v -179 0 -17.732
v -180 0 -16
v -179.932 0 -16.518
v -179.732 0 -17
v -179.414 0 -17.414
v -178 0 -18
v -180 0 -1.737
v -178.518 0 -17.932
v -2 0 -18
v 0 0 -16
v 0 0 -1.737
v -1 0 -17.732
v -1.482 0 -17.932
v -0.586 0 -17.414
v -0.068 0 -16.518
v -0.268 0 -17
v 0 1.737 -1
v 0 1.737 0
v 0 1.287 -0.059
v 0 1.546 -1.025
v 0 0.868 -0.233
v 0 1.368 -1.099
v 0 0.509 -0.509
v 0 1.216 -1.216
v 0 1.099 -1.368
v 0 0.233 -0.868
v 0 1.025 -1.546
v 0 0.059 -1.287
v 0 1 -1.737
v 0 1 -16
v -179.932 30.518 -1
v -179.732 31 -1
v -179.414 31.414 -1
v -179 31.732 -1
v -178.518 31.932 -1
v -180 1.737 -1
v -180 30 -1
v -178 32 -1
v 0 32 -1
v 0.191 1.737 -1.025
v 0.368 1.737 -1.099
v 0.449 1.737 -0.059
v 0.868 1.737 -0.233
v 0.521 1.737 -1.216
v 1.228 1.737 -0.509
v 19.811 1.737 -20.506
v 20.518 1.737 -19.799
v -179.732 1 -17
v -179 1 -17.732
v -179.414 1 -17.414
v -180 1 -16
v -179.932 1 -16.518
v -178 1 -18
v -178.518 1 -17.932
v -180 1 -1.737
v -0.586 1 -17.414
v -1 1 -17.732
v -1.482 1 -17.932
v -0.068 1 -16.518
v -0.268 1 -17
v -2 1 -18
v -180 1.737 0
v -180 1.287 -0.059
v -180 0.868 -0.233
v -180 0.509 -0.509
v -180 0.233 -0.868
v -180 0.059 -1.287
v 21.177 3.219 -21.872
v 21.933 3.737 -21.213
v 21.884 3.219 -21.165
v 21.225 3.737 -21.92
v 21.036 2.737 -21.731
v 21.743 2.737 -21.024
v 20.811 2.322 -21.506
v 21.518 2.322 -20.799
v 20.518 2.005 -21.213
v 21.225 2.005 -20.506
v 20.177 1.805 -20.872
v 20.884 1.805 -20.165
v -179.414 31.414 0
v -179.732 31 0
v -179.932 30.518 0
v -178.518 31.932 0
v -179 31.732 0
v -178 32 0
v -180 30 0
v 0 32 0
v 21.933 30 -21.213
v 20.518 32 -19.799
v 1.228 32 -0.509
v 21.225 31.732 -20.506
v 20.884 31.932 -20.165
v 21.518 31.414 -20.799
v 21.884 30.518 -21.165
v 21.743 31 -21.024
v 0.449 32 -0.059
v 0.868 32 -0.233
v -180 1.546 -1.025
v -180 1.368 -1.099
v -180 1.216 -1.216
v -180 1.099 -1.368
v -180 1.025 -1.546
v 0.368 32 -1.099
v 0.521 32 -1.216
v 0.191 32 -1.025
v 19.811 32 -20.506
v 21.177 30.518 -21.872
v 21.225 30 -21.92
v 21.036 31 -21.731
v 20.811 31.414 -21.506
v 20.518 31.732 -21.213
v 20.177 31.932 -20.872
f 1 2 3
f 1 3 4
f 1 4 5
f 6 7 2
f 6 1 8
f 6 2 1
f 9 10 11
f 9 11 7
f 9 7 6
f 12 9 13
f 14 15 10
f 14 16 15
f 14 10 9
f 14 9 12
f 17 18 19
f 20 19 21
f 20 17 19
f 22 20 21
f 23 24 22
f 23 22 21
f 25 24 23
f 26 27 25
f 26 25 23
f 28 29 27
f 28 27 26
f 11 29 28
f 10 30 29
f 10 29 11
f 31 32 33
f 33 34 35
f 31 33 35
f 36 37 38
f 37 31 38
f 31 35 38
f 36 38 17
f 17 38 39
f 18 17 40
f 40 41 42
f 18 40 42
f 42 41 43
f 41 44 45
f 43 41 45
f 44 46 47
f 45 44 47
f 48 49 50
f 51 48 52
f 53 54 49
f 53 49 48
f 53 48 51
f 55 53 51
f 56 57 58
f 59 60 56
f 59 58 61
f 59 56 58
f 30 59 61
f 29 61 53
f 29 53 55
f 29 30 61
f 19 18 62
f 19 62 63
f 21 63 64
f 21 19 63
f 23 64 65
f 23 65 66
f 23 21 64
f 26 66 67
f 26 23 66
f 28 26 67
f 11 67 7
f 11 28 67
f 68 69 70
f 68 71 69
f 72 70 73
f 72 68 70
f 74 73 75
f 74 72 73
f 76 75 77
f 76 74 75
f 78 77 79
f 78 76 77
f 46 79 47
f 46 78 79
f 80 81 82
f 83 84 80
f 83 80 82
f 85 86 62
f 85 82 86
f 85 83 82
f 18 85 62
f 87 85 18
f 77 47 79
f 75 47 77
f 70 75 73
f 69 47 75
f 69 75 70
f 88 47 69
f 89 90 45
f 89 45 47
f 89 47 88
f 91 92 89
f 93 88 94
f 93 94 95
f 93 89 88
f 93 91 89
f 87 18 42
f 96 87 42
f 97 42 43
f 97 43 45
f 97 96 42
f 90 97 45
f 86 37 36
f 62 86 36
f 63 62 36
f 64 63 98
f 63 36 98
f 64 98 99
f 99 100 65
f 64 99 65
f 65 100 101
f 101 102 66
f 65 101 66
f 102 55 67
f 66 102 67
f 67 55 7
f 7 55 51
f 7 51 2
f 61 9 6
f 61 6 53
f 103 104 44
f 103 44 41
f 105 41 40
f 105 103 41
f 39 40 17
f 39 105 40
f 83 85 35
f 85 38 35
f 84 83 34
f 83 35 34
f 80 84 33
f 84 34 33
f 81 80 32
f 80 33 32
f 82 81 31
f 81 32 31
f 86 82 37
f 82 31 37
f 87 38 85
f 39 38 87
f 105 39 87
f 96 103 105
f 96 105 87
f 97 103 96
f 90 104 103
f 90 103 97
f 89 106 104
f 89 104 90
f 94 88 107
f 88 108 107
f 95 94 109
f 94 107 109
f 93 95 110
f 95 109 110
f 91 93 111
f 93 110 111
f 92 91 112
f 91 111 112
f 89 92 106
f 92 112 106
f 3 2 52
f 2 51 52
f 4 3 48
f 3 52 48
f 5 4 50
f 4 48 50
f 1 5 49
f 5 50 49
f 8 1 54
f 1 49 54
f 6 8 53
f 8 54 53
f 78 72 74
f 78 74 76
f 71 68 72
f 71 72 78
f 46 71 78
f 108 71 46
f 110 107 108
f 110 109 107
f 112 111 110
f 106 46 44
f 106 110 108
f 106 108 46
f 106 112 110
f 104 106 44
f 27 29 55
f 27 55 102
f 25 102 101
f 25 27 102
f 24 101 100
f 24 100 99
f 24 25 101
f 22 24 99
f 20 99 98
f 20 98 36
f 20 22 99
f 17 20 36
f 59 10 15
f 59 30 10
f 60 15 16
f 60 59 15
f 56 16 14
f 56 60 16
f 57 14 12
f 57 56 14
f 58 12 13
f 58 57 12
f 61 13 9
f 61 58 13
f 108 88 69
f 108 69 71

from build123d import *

# Parameters (mm, degrees)
SKETCH2_W                    = 180
SKETCH2_H                    = 32
BASE_FLANGE1_DEPTH           = 1
EDGE_FLANGE1_STRIP_W         = 5.4732
EDGE_FLANGE1_STRIP_H         = 1
EDGE_FLANGE1_STRIP_CUT_DEPTH = 180
EDGE_FLANGE1_DEPTH           = 180
EDGE_FLANGE2_DEPTH           = 30.2634
FILLET1_R                    = 2


# Sheet-metal steps are written as plain solids
with BuildPart() as part:
    # Sketch2 → Base-Flange1 (new body)
    with BuildSketch(Plane.XY):
        with Locations((-90, 16)):
            Rectangle(SKETCH2_W, SKETCH2_H)
    extrude(amount=-BASE_FLANGE1_DEPTH)

    # Edge-Flange1 strip (across the edge) → Edge-Flange1 strip cut (cut)
    with BuildSketch(Plane(origin=(0, 0, -1), x_dir=(0, 1, 0), z_dir=(-1, 0, 0))):
        with Locations((-1, -0.5)):
            Rectangle(EDGE_FLANGE1_STRIP_W, EDGE_FLANGE1_STRIP_H)
    extrude(amount=EDGE_FLANGE1_STRIP_CUT_DEPTH, mode=Mode.SUBTRACT)

    # Edge-Flange1 section (across the edge) → Edge-Flange1 (add)
    with BuildSketch(Plane(origin=(0, 0, -1), x_dir=(0, 1, 0), z_dir=(-1, 0, 0))):
        with BuildLine():
            Line((0, 0.7366), (0, 17))
            Line((0, 17), (1, 17))
            Line((1, 17), (1, 0.7366))
            ThreePointArc((1, 0.7366), (1.215745145, 0.215745145), (1.7366, 0))
            Line((1.7366, 0), (1.7366, -1))
            ThreePointArc((1.7366, -1), (0.508638364, -0.491361636), (0, 0.7366))
        make_face()
    extrude(amount=EDGE_FLANGE1_DEPTH)

    # Edge-Flange2 section (across the edge) → Edge-Flange2 (add)
    with BuildSketch(Plane(origin=(0.30510971, 32, -1), x_dir=(-0.7071067811865438, 0, -0.7071067811865512), z_dir=(0, -1, 0))):
        with BuildLine():
            Line((-1, 0.30510971), (-1, 29.585786438))
            Line((-1, 29.585786438), (0, 29.585786438))
            Line((0, 29.585786438), (0, 0.30510971))
            ThreePointArc((0, 0.30510971), (0.056070336, 0.023225094), (0.215745145, -0.215745145))
            Line((0.215745145, -0.215745145), (-0.491361636, -0.922851926))
            ThreePointArc((-0.491361636, -0.922851926), (-0.867809196, -0.359458339), (-1, 0.30510971))
        make_face()
    extrude(amount=EDGE_FLANGE2_DEPTH)

    # Fillet1
    fillet1_edges = [part.edges().sort_by_distance(p)[0] for p in [
        (0, 0.5, -18),
        (-180, 0.5, -18),
        (21.578973317, 32, -21.566756826),
        (21.578973317, 1.7366, -21.566756826),
        (-180, 32, -0.5),
    ]]
    fillet(fillet1_edges, radius=FILLET1_R)


solid = part.part
